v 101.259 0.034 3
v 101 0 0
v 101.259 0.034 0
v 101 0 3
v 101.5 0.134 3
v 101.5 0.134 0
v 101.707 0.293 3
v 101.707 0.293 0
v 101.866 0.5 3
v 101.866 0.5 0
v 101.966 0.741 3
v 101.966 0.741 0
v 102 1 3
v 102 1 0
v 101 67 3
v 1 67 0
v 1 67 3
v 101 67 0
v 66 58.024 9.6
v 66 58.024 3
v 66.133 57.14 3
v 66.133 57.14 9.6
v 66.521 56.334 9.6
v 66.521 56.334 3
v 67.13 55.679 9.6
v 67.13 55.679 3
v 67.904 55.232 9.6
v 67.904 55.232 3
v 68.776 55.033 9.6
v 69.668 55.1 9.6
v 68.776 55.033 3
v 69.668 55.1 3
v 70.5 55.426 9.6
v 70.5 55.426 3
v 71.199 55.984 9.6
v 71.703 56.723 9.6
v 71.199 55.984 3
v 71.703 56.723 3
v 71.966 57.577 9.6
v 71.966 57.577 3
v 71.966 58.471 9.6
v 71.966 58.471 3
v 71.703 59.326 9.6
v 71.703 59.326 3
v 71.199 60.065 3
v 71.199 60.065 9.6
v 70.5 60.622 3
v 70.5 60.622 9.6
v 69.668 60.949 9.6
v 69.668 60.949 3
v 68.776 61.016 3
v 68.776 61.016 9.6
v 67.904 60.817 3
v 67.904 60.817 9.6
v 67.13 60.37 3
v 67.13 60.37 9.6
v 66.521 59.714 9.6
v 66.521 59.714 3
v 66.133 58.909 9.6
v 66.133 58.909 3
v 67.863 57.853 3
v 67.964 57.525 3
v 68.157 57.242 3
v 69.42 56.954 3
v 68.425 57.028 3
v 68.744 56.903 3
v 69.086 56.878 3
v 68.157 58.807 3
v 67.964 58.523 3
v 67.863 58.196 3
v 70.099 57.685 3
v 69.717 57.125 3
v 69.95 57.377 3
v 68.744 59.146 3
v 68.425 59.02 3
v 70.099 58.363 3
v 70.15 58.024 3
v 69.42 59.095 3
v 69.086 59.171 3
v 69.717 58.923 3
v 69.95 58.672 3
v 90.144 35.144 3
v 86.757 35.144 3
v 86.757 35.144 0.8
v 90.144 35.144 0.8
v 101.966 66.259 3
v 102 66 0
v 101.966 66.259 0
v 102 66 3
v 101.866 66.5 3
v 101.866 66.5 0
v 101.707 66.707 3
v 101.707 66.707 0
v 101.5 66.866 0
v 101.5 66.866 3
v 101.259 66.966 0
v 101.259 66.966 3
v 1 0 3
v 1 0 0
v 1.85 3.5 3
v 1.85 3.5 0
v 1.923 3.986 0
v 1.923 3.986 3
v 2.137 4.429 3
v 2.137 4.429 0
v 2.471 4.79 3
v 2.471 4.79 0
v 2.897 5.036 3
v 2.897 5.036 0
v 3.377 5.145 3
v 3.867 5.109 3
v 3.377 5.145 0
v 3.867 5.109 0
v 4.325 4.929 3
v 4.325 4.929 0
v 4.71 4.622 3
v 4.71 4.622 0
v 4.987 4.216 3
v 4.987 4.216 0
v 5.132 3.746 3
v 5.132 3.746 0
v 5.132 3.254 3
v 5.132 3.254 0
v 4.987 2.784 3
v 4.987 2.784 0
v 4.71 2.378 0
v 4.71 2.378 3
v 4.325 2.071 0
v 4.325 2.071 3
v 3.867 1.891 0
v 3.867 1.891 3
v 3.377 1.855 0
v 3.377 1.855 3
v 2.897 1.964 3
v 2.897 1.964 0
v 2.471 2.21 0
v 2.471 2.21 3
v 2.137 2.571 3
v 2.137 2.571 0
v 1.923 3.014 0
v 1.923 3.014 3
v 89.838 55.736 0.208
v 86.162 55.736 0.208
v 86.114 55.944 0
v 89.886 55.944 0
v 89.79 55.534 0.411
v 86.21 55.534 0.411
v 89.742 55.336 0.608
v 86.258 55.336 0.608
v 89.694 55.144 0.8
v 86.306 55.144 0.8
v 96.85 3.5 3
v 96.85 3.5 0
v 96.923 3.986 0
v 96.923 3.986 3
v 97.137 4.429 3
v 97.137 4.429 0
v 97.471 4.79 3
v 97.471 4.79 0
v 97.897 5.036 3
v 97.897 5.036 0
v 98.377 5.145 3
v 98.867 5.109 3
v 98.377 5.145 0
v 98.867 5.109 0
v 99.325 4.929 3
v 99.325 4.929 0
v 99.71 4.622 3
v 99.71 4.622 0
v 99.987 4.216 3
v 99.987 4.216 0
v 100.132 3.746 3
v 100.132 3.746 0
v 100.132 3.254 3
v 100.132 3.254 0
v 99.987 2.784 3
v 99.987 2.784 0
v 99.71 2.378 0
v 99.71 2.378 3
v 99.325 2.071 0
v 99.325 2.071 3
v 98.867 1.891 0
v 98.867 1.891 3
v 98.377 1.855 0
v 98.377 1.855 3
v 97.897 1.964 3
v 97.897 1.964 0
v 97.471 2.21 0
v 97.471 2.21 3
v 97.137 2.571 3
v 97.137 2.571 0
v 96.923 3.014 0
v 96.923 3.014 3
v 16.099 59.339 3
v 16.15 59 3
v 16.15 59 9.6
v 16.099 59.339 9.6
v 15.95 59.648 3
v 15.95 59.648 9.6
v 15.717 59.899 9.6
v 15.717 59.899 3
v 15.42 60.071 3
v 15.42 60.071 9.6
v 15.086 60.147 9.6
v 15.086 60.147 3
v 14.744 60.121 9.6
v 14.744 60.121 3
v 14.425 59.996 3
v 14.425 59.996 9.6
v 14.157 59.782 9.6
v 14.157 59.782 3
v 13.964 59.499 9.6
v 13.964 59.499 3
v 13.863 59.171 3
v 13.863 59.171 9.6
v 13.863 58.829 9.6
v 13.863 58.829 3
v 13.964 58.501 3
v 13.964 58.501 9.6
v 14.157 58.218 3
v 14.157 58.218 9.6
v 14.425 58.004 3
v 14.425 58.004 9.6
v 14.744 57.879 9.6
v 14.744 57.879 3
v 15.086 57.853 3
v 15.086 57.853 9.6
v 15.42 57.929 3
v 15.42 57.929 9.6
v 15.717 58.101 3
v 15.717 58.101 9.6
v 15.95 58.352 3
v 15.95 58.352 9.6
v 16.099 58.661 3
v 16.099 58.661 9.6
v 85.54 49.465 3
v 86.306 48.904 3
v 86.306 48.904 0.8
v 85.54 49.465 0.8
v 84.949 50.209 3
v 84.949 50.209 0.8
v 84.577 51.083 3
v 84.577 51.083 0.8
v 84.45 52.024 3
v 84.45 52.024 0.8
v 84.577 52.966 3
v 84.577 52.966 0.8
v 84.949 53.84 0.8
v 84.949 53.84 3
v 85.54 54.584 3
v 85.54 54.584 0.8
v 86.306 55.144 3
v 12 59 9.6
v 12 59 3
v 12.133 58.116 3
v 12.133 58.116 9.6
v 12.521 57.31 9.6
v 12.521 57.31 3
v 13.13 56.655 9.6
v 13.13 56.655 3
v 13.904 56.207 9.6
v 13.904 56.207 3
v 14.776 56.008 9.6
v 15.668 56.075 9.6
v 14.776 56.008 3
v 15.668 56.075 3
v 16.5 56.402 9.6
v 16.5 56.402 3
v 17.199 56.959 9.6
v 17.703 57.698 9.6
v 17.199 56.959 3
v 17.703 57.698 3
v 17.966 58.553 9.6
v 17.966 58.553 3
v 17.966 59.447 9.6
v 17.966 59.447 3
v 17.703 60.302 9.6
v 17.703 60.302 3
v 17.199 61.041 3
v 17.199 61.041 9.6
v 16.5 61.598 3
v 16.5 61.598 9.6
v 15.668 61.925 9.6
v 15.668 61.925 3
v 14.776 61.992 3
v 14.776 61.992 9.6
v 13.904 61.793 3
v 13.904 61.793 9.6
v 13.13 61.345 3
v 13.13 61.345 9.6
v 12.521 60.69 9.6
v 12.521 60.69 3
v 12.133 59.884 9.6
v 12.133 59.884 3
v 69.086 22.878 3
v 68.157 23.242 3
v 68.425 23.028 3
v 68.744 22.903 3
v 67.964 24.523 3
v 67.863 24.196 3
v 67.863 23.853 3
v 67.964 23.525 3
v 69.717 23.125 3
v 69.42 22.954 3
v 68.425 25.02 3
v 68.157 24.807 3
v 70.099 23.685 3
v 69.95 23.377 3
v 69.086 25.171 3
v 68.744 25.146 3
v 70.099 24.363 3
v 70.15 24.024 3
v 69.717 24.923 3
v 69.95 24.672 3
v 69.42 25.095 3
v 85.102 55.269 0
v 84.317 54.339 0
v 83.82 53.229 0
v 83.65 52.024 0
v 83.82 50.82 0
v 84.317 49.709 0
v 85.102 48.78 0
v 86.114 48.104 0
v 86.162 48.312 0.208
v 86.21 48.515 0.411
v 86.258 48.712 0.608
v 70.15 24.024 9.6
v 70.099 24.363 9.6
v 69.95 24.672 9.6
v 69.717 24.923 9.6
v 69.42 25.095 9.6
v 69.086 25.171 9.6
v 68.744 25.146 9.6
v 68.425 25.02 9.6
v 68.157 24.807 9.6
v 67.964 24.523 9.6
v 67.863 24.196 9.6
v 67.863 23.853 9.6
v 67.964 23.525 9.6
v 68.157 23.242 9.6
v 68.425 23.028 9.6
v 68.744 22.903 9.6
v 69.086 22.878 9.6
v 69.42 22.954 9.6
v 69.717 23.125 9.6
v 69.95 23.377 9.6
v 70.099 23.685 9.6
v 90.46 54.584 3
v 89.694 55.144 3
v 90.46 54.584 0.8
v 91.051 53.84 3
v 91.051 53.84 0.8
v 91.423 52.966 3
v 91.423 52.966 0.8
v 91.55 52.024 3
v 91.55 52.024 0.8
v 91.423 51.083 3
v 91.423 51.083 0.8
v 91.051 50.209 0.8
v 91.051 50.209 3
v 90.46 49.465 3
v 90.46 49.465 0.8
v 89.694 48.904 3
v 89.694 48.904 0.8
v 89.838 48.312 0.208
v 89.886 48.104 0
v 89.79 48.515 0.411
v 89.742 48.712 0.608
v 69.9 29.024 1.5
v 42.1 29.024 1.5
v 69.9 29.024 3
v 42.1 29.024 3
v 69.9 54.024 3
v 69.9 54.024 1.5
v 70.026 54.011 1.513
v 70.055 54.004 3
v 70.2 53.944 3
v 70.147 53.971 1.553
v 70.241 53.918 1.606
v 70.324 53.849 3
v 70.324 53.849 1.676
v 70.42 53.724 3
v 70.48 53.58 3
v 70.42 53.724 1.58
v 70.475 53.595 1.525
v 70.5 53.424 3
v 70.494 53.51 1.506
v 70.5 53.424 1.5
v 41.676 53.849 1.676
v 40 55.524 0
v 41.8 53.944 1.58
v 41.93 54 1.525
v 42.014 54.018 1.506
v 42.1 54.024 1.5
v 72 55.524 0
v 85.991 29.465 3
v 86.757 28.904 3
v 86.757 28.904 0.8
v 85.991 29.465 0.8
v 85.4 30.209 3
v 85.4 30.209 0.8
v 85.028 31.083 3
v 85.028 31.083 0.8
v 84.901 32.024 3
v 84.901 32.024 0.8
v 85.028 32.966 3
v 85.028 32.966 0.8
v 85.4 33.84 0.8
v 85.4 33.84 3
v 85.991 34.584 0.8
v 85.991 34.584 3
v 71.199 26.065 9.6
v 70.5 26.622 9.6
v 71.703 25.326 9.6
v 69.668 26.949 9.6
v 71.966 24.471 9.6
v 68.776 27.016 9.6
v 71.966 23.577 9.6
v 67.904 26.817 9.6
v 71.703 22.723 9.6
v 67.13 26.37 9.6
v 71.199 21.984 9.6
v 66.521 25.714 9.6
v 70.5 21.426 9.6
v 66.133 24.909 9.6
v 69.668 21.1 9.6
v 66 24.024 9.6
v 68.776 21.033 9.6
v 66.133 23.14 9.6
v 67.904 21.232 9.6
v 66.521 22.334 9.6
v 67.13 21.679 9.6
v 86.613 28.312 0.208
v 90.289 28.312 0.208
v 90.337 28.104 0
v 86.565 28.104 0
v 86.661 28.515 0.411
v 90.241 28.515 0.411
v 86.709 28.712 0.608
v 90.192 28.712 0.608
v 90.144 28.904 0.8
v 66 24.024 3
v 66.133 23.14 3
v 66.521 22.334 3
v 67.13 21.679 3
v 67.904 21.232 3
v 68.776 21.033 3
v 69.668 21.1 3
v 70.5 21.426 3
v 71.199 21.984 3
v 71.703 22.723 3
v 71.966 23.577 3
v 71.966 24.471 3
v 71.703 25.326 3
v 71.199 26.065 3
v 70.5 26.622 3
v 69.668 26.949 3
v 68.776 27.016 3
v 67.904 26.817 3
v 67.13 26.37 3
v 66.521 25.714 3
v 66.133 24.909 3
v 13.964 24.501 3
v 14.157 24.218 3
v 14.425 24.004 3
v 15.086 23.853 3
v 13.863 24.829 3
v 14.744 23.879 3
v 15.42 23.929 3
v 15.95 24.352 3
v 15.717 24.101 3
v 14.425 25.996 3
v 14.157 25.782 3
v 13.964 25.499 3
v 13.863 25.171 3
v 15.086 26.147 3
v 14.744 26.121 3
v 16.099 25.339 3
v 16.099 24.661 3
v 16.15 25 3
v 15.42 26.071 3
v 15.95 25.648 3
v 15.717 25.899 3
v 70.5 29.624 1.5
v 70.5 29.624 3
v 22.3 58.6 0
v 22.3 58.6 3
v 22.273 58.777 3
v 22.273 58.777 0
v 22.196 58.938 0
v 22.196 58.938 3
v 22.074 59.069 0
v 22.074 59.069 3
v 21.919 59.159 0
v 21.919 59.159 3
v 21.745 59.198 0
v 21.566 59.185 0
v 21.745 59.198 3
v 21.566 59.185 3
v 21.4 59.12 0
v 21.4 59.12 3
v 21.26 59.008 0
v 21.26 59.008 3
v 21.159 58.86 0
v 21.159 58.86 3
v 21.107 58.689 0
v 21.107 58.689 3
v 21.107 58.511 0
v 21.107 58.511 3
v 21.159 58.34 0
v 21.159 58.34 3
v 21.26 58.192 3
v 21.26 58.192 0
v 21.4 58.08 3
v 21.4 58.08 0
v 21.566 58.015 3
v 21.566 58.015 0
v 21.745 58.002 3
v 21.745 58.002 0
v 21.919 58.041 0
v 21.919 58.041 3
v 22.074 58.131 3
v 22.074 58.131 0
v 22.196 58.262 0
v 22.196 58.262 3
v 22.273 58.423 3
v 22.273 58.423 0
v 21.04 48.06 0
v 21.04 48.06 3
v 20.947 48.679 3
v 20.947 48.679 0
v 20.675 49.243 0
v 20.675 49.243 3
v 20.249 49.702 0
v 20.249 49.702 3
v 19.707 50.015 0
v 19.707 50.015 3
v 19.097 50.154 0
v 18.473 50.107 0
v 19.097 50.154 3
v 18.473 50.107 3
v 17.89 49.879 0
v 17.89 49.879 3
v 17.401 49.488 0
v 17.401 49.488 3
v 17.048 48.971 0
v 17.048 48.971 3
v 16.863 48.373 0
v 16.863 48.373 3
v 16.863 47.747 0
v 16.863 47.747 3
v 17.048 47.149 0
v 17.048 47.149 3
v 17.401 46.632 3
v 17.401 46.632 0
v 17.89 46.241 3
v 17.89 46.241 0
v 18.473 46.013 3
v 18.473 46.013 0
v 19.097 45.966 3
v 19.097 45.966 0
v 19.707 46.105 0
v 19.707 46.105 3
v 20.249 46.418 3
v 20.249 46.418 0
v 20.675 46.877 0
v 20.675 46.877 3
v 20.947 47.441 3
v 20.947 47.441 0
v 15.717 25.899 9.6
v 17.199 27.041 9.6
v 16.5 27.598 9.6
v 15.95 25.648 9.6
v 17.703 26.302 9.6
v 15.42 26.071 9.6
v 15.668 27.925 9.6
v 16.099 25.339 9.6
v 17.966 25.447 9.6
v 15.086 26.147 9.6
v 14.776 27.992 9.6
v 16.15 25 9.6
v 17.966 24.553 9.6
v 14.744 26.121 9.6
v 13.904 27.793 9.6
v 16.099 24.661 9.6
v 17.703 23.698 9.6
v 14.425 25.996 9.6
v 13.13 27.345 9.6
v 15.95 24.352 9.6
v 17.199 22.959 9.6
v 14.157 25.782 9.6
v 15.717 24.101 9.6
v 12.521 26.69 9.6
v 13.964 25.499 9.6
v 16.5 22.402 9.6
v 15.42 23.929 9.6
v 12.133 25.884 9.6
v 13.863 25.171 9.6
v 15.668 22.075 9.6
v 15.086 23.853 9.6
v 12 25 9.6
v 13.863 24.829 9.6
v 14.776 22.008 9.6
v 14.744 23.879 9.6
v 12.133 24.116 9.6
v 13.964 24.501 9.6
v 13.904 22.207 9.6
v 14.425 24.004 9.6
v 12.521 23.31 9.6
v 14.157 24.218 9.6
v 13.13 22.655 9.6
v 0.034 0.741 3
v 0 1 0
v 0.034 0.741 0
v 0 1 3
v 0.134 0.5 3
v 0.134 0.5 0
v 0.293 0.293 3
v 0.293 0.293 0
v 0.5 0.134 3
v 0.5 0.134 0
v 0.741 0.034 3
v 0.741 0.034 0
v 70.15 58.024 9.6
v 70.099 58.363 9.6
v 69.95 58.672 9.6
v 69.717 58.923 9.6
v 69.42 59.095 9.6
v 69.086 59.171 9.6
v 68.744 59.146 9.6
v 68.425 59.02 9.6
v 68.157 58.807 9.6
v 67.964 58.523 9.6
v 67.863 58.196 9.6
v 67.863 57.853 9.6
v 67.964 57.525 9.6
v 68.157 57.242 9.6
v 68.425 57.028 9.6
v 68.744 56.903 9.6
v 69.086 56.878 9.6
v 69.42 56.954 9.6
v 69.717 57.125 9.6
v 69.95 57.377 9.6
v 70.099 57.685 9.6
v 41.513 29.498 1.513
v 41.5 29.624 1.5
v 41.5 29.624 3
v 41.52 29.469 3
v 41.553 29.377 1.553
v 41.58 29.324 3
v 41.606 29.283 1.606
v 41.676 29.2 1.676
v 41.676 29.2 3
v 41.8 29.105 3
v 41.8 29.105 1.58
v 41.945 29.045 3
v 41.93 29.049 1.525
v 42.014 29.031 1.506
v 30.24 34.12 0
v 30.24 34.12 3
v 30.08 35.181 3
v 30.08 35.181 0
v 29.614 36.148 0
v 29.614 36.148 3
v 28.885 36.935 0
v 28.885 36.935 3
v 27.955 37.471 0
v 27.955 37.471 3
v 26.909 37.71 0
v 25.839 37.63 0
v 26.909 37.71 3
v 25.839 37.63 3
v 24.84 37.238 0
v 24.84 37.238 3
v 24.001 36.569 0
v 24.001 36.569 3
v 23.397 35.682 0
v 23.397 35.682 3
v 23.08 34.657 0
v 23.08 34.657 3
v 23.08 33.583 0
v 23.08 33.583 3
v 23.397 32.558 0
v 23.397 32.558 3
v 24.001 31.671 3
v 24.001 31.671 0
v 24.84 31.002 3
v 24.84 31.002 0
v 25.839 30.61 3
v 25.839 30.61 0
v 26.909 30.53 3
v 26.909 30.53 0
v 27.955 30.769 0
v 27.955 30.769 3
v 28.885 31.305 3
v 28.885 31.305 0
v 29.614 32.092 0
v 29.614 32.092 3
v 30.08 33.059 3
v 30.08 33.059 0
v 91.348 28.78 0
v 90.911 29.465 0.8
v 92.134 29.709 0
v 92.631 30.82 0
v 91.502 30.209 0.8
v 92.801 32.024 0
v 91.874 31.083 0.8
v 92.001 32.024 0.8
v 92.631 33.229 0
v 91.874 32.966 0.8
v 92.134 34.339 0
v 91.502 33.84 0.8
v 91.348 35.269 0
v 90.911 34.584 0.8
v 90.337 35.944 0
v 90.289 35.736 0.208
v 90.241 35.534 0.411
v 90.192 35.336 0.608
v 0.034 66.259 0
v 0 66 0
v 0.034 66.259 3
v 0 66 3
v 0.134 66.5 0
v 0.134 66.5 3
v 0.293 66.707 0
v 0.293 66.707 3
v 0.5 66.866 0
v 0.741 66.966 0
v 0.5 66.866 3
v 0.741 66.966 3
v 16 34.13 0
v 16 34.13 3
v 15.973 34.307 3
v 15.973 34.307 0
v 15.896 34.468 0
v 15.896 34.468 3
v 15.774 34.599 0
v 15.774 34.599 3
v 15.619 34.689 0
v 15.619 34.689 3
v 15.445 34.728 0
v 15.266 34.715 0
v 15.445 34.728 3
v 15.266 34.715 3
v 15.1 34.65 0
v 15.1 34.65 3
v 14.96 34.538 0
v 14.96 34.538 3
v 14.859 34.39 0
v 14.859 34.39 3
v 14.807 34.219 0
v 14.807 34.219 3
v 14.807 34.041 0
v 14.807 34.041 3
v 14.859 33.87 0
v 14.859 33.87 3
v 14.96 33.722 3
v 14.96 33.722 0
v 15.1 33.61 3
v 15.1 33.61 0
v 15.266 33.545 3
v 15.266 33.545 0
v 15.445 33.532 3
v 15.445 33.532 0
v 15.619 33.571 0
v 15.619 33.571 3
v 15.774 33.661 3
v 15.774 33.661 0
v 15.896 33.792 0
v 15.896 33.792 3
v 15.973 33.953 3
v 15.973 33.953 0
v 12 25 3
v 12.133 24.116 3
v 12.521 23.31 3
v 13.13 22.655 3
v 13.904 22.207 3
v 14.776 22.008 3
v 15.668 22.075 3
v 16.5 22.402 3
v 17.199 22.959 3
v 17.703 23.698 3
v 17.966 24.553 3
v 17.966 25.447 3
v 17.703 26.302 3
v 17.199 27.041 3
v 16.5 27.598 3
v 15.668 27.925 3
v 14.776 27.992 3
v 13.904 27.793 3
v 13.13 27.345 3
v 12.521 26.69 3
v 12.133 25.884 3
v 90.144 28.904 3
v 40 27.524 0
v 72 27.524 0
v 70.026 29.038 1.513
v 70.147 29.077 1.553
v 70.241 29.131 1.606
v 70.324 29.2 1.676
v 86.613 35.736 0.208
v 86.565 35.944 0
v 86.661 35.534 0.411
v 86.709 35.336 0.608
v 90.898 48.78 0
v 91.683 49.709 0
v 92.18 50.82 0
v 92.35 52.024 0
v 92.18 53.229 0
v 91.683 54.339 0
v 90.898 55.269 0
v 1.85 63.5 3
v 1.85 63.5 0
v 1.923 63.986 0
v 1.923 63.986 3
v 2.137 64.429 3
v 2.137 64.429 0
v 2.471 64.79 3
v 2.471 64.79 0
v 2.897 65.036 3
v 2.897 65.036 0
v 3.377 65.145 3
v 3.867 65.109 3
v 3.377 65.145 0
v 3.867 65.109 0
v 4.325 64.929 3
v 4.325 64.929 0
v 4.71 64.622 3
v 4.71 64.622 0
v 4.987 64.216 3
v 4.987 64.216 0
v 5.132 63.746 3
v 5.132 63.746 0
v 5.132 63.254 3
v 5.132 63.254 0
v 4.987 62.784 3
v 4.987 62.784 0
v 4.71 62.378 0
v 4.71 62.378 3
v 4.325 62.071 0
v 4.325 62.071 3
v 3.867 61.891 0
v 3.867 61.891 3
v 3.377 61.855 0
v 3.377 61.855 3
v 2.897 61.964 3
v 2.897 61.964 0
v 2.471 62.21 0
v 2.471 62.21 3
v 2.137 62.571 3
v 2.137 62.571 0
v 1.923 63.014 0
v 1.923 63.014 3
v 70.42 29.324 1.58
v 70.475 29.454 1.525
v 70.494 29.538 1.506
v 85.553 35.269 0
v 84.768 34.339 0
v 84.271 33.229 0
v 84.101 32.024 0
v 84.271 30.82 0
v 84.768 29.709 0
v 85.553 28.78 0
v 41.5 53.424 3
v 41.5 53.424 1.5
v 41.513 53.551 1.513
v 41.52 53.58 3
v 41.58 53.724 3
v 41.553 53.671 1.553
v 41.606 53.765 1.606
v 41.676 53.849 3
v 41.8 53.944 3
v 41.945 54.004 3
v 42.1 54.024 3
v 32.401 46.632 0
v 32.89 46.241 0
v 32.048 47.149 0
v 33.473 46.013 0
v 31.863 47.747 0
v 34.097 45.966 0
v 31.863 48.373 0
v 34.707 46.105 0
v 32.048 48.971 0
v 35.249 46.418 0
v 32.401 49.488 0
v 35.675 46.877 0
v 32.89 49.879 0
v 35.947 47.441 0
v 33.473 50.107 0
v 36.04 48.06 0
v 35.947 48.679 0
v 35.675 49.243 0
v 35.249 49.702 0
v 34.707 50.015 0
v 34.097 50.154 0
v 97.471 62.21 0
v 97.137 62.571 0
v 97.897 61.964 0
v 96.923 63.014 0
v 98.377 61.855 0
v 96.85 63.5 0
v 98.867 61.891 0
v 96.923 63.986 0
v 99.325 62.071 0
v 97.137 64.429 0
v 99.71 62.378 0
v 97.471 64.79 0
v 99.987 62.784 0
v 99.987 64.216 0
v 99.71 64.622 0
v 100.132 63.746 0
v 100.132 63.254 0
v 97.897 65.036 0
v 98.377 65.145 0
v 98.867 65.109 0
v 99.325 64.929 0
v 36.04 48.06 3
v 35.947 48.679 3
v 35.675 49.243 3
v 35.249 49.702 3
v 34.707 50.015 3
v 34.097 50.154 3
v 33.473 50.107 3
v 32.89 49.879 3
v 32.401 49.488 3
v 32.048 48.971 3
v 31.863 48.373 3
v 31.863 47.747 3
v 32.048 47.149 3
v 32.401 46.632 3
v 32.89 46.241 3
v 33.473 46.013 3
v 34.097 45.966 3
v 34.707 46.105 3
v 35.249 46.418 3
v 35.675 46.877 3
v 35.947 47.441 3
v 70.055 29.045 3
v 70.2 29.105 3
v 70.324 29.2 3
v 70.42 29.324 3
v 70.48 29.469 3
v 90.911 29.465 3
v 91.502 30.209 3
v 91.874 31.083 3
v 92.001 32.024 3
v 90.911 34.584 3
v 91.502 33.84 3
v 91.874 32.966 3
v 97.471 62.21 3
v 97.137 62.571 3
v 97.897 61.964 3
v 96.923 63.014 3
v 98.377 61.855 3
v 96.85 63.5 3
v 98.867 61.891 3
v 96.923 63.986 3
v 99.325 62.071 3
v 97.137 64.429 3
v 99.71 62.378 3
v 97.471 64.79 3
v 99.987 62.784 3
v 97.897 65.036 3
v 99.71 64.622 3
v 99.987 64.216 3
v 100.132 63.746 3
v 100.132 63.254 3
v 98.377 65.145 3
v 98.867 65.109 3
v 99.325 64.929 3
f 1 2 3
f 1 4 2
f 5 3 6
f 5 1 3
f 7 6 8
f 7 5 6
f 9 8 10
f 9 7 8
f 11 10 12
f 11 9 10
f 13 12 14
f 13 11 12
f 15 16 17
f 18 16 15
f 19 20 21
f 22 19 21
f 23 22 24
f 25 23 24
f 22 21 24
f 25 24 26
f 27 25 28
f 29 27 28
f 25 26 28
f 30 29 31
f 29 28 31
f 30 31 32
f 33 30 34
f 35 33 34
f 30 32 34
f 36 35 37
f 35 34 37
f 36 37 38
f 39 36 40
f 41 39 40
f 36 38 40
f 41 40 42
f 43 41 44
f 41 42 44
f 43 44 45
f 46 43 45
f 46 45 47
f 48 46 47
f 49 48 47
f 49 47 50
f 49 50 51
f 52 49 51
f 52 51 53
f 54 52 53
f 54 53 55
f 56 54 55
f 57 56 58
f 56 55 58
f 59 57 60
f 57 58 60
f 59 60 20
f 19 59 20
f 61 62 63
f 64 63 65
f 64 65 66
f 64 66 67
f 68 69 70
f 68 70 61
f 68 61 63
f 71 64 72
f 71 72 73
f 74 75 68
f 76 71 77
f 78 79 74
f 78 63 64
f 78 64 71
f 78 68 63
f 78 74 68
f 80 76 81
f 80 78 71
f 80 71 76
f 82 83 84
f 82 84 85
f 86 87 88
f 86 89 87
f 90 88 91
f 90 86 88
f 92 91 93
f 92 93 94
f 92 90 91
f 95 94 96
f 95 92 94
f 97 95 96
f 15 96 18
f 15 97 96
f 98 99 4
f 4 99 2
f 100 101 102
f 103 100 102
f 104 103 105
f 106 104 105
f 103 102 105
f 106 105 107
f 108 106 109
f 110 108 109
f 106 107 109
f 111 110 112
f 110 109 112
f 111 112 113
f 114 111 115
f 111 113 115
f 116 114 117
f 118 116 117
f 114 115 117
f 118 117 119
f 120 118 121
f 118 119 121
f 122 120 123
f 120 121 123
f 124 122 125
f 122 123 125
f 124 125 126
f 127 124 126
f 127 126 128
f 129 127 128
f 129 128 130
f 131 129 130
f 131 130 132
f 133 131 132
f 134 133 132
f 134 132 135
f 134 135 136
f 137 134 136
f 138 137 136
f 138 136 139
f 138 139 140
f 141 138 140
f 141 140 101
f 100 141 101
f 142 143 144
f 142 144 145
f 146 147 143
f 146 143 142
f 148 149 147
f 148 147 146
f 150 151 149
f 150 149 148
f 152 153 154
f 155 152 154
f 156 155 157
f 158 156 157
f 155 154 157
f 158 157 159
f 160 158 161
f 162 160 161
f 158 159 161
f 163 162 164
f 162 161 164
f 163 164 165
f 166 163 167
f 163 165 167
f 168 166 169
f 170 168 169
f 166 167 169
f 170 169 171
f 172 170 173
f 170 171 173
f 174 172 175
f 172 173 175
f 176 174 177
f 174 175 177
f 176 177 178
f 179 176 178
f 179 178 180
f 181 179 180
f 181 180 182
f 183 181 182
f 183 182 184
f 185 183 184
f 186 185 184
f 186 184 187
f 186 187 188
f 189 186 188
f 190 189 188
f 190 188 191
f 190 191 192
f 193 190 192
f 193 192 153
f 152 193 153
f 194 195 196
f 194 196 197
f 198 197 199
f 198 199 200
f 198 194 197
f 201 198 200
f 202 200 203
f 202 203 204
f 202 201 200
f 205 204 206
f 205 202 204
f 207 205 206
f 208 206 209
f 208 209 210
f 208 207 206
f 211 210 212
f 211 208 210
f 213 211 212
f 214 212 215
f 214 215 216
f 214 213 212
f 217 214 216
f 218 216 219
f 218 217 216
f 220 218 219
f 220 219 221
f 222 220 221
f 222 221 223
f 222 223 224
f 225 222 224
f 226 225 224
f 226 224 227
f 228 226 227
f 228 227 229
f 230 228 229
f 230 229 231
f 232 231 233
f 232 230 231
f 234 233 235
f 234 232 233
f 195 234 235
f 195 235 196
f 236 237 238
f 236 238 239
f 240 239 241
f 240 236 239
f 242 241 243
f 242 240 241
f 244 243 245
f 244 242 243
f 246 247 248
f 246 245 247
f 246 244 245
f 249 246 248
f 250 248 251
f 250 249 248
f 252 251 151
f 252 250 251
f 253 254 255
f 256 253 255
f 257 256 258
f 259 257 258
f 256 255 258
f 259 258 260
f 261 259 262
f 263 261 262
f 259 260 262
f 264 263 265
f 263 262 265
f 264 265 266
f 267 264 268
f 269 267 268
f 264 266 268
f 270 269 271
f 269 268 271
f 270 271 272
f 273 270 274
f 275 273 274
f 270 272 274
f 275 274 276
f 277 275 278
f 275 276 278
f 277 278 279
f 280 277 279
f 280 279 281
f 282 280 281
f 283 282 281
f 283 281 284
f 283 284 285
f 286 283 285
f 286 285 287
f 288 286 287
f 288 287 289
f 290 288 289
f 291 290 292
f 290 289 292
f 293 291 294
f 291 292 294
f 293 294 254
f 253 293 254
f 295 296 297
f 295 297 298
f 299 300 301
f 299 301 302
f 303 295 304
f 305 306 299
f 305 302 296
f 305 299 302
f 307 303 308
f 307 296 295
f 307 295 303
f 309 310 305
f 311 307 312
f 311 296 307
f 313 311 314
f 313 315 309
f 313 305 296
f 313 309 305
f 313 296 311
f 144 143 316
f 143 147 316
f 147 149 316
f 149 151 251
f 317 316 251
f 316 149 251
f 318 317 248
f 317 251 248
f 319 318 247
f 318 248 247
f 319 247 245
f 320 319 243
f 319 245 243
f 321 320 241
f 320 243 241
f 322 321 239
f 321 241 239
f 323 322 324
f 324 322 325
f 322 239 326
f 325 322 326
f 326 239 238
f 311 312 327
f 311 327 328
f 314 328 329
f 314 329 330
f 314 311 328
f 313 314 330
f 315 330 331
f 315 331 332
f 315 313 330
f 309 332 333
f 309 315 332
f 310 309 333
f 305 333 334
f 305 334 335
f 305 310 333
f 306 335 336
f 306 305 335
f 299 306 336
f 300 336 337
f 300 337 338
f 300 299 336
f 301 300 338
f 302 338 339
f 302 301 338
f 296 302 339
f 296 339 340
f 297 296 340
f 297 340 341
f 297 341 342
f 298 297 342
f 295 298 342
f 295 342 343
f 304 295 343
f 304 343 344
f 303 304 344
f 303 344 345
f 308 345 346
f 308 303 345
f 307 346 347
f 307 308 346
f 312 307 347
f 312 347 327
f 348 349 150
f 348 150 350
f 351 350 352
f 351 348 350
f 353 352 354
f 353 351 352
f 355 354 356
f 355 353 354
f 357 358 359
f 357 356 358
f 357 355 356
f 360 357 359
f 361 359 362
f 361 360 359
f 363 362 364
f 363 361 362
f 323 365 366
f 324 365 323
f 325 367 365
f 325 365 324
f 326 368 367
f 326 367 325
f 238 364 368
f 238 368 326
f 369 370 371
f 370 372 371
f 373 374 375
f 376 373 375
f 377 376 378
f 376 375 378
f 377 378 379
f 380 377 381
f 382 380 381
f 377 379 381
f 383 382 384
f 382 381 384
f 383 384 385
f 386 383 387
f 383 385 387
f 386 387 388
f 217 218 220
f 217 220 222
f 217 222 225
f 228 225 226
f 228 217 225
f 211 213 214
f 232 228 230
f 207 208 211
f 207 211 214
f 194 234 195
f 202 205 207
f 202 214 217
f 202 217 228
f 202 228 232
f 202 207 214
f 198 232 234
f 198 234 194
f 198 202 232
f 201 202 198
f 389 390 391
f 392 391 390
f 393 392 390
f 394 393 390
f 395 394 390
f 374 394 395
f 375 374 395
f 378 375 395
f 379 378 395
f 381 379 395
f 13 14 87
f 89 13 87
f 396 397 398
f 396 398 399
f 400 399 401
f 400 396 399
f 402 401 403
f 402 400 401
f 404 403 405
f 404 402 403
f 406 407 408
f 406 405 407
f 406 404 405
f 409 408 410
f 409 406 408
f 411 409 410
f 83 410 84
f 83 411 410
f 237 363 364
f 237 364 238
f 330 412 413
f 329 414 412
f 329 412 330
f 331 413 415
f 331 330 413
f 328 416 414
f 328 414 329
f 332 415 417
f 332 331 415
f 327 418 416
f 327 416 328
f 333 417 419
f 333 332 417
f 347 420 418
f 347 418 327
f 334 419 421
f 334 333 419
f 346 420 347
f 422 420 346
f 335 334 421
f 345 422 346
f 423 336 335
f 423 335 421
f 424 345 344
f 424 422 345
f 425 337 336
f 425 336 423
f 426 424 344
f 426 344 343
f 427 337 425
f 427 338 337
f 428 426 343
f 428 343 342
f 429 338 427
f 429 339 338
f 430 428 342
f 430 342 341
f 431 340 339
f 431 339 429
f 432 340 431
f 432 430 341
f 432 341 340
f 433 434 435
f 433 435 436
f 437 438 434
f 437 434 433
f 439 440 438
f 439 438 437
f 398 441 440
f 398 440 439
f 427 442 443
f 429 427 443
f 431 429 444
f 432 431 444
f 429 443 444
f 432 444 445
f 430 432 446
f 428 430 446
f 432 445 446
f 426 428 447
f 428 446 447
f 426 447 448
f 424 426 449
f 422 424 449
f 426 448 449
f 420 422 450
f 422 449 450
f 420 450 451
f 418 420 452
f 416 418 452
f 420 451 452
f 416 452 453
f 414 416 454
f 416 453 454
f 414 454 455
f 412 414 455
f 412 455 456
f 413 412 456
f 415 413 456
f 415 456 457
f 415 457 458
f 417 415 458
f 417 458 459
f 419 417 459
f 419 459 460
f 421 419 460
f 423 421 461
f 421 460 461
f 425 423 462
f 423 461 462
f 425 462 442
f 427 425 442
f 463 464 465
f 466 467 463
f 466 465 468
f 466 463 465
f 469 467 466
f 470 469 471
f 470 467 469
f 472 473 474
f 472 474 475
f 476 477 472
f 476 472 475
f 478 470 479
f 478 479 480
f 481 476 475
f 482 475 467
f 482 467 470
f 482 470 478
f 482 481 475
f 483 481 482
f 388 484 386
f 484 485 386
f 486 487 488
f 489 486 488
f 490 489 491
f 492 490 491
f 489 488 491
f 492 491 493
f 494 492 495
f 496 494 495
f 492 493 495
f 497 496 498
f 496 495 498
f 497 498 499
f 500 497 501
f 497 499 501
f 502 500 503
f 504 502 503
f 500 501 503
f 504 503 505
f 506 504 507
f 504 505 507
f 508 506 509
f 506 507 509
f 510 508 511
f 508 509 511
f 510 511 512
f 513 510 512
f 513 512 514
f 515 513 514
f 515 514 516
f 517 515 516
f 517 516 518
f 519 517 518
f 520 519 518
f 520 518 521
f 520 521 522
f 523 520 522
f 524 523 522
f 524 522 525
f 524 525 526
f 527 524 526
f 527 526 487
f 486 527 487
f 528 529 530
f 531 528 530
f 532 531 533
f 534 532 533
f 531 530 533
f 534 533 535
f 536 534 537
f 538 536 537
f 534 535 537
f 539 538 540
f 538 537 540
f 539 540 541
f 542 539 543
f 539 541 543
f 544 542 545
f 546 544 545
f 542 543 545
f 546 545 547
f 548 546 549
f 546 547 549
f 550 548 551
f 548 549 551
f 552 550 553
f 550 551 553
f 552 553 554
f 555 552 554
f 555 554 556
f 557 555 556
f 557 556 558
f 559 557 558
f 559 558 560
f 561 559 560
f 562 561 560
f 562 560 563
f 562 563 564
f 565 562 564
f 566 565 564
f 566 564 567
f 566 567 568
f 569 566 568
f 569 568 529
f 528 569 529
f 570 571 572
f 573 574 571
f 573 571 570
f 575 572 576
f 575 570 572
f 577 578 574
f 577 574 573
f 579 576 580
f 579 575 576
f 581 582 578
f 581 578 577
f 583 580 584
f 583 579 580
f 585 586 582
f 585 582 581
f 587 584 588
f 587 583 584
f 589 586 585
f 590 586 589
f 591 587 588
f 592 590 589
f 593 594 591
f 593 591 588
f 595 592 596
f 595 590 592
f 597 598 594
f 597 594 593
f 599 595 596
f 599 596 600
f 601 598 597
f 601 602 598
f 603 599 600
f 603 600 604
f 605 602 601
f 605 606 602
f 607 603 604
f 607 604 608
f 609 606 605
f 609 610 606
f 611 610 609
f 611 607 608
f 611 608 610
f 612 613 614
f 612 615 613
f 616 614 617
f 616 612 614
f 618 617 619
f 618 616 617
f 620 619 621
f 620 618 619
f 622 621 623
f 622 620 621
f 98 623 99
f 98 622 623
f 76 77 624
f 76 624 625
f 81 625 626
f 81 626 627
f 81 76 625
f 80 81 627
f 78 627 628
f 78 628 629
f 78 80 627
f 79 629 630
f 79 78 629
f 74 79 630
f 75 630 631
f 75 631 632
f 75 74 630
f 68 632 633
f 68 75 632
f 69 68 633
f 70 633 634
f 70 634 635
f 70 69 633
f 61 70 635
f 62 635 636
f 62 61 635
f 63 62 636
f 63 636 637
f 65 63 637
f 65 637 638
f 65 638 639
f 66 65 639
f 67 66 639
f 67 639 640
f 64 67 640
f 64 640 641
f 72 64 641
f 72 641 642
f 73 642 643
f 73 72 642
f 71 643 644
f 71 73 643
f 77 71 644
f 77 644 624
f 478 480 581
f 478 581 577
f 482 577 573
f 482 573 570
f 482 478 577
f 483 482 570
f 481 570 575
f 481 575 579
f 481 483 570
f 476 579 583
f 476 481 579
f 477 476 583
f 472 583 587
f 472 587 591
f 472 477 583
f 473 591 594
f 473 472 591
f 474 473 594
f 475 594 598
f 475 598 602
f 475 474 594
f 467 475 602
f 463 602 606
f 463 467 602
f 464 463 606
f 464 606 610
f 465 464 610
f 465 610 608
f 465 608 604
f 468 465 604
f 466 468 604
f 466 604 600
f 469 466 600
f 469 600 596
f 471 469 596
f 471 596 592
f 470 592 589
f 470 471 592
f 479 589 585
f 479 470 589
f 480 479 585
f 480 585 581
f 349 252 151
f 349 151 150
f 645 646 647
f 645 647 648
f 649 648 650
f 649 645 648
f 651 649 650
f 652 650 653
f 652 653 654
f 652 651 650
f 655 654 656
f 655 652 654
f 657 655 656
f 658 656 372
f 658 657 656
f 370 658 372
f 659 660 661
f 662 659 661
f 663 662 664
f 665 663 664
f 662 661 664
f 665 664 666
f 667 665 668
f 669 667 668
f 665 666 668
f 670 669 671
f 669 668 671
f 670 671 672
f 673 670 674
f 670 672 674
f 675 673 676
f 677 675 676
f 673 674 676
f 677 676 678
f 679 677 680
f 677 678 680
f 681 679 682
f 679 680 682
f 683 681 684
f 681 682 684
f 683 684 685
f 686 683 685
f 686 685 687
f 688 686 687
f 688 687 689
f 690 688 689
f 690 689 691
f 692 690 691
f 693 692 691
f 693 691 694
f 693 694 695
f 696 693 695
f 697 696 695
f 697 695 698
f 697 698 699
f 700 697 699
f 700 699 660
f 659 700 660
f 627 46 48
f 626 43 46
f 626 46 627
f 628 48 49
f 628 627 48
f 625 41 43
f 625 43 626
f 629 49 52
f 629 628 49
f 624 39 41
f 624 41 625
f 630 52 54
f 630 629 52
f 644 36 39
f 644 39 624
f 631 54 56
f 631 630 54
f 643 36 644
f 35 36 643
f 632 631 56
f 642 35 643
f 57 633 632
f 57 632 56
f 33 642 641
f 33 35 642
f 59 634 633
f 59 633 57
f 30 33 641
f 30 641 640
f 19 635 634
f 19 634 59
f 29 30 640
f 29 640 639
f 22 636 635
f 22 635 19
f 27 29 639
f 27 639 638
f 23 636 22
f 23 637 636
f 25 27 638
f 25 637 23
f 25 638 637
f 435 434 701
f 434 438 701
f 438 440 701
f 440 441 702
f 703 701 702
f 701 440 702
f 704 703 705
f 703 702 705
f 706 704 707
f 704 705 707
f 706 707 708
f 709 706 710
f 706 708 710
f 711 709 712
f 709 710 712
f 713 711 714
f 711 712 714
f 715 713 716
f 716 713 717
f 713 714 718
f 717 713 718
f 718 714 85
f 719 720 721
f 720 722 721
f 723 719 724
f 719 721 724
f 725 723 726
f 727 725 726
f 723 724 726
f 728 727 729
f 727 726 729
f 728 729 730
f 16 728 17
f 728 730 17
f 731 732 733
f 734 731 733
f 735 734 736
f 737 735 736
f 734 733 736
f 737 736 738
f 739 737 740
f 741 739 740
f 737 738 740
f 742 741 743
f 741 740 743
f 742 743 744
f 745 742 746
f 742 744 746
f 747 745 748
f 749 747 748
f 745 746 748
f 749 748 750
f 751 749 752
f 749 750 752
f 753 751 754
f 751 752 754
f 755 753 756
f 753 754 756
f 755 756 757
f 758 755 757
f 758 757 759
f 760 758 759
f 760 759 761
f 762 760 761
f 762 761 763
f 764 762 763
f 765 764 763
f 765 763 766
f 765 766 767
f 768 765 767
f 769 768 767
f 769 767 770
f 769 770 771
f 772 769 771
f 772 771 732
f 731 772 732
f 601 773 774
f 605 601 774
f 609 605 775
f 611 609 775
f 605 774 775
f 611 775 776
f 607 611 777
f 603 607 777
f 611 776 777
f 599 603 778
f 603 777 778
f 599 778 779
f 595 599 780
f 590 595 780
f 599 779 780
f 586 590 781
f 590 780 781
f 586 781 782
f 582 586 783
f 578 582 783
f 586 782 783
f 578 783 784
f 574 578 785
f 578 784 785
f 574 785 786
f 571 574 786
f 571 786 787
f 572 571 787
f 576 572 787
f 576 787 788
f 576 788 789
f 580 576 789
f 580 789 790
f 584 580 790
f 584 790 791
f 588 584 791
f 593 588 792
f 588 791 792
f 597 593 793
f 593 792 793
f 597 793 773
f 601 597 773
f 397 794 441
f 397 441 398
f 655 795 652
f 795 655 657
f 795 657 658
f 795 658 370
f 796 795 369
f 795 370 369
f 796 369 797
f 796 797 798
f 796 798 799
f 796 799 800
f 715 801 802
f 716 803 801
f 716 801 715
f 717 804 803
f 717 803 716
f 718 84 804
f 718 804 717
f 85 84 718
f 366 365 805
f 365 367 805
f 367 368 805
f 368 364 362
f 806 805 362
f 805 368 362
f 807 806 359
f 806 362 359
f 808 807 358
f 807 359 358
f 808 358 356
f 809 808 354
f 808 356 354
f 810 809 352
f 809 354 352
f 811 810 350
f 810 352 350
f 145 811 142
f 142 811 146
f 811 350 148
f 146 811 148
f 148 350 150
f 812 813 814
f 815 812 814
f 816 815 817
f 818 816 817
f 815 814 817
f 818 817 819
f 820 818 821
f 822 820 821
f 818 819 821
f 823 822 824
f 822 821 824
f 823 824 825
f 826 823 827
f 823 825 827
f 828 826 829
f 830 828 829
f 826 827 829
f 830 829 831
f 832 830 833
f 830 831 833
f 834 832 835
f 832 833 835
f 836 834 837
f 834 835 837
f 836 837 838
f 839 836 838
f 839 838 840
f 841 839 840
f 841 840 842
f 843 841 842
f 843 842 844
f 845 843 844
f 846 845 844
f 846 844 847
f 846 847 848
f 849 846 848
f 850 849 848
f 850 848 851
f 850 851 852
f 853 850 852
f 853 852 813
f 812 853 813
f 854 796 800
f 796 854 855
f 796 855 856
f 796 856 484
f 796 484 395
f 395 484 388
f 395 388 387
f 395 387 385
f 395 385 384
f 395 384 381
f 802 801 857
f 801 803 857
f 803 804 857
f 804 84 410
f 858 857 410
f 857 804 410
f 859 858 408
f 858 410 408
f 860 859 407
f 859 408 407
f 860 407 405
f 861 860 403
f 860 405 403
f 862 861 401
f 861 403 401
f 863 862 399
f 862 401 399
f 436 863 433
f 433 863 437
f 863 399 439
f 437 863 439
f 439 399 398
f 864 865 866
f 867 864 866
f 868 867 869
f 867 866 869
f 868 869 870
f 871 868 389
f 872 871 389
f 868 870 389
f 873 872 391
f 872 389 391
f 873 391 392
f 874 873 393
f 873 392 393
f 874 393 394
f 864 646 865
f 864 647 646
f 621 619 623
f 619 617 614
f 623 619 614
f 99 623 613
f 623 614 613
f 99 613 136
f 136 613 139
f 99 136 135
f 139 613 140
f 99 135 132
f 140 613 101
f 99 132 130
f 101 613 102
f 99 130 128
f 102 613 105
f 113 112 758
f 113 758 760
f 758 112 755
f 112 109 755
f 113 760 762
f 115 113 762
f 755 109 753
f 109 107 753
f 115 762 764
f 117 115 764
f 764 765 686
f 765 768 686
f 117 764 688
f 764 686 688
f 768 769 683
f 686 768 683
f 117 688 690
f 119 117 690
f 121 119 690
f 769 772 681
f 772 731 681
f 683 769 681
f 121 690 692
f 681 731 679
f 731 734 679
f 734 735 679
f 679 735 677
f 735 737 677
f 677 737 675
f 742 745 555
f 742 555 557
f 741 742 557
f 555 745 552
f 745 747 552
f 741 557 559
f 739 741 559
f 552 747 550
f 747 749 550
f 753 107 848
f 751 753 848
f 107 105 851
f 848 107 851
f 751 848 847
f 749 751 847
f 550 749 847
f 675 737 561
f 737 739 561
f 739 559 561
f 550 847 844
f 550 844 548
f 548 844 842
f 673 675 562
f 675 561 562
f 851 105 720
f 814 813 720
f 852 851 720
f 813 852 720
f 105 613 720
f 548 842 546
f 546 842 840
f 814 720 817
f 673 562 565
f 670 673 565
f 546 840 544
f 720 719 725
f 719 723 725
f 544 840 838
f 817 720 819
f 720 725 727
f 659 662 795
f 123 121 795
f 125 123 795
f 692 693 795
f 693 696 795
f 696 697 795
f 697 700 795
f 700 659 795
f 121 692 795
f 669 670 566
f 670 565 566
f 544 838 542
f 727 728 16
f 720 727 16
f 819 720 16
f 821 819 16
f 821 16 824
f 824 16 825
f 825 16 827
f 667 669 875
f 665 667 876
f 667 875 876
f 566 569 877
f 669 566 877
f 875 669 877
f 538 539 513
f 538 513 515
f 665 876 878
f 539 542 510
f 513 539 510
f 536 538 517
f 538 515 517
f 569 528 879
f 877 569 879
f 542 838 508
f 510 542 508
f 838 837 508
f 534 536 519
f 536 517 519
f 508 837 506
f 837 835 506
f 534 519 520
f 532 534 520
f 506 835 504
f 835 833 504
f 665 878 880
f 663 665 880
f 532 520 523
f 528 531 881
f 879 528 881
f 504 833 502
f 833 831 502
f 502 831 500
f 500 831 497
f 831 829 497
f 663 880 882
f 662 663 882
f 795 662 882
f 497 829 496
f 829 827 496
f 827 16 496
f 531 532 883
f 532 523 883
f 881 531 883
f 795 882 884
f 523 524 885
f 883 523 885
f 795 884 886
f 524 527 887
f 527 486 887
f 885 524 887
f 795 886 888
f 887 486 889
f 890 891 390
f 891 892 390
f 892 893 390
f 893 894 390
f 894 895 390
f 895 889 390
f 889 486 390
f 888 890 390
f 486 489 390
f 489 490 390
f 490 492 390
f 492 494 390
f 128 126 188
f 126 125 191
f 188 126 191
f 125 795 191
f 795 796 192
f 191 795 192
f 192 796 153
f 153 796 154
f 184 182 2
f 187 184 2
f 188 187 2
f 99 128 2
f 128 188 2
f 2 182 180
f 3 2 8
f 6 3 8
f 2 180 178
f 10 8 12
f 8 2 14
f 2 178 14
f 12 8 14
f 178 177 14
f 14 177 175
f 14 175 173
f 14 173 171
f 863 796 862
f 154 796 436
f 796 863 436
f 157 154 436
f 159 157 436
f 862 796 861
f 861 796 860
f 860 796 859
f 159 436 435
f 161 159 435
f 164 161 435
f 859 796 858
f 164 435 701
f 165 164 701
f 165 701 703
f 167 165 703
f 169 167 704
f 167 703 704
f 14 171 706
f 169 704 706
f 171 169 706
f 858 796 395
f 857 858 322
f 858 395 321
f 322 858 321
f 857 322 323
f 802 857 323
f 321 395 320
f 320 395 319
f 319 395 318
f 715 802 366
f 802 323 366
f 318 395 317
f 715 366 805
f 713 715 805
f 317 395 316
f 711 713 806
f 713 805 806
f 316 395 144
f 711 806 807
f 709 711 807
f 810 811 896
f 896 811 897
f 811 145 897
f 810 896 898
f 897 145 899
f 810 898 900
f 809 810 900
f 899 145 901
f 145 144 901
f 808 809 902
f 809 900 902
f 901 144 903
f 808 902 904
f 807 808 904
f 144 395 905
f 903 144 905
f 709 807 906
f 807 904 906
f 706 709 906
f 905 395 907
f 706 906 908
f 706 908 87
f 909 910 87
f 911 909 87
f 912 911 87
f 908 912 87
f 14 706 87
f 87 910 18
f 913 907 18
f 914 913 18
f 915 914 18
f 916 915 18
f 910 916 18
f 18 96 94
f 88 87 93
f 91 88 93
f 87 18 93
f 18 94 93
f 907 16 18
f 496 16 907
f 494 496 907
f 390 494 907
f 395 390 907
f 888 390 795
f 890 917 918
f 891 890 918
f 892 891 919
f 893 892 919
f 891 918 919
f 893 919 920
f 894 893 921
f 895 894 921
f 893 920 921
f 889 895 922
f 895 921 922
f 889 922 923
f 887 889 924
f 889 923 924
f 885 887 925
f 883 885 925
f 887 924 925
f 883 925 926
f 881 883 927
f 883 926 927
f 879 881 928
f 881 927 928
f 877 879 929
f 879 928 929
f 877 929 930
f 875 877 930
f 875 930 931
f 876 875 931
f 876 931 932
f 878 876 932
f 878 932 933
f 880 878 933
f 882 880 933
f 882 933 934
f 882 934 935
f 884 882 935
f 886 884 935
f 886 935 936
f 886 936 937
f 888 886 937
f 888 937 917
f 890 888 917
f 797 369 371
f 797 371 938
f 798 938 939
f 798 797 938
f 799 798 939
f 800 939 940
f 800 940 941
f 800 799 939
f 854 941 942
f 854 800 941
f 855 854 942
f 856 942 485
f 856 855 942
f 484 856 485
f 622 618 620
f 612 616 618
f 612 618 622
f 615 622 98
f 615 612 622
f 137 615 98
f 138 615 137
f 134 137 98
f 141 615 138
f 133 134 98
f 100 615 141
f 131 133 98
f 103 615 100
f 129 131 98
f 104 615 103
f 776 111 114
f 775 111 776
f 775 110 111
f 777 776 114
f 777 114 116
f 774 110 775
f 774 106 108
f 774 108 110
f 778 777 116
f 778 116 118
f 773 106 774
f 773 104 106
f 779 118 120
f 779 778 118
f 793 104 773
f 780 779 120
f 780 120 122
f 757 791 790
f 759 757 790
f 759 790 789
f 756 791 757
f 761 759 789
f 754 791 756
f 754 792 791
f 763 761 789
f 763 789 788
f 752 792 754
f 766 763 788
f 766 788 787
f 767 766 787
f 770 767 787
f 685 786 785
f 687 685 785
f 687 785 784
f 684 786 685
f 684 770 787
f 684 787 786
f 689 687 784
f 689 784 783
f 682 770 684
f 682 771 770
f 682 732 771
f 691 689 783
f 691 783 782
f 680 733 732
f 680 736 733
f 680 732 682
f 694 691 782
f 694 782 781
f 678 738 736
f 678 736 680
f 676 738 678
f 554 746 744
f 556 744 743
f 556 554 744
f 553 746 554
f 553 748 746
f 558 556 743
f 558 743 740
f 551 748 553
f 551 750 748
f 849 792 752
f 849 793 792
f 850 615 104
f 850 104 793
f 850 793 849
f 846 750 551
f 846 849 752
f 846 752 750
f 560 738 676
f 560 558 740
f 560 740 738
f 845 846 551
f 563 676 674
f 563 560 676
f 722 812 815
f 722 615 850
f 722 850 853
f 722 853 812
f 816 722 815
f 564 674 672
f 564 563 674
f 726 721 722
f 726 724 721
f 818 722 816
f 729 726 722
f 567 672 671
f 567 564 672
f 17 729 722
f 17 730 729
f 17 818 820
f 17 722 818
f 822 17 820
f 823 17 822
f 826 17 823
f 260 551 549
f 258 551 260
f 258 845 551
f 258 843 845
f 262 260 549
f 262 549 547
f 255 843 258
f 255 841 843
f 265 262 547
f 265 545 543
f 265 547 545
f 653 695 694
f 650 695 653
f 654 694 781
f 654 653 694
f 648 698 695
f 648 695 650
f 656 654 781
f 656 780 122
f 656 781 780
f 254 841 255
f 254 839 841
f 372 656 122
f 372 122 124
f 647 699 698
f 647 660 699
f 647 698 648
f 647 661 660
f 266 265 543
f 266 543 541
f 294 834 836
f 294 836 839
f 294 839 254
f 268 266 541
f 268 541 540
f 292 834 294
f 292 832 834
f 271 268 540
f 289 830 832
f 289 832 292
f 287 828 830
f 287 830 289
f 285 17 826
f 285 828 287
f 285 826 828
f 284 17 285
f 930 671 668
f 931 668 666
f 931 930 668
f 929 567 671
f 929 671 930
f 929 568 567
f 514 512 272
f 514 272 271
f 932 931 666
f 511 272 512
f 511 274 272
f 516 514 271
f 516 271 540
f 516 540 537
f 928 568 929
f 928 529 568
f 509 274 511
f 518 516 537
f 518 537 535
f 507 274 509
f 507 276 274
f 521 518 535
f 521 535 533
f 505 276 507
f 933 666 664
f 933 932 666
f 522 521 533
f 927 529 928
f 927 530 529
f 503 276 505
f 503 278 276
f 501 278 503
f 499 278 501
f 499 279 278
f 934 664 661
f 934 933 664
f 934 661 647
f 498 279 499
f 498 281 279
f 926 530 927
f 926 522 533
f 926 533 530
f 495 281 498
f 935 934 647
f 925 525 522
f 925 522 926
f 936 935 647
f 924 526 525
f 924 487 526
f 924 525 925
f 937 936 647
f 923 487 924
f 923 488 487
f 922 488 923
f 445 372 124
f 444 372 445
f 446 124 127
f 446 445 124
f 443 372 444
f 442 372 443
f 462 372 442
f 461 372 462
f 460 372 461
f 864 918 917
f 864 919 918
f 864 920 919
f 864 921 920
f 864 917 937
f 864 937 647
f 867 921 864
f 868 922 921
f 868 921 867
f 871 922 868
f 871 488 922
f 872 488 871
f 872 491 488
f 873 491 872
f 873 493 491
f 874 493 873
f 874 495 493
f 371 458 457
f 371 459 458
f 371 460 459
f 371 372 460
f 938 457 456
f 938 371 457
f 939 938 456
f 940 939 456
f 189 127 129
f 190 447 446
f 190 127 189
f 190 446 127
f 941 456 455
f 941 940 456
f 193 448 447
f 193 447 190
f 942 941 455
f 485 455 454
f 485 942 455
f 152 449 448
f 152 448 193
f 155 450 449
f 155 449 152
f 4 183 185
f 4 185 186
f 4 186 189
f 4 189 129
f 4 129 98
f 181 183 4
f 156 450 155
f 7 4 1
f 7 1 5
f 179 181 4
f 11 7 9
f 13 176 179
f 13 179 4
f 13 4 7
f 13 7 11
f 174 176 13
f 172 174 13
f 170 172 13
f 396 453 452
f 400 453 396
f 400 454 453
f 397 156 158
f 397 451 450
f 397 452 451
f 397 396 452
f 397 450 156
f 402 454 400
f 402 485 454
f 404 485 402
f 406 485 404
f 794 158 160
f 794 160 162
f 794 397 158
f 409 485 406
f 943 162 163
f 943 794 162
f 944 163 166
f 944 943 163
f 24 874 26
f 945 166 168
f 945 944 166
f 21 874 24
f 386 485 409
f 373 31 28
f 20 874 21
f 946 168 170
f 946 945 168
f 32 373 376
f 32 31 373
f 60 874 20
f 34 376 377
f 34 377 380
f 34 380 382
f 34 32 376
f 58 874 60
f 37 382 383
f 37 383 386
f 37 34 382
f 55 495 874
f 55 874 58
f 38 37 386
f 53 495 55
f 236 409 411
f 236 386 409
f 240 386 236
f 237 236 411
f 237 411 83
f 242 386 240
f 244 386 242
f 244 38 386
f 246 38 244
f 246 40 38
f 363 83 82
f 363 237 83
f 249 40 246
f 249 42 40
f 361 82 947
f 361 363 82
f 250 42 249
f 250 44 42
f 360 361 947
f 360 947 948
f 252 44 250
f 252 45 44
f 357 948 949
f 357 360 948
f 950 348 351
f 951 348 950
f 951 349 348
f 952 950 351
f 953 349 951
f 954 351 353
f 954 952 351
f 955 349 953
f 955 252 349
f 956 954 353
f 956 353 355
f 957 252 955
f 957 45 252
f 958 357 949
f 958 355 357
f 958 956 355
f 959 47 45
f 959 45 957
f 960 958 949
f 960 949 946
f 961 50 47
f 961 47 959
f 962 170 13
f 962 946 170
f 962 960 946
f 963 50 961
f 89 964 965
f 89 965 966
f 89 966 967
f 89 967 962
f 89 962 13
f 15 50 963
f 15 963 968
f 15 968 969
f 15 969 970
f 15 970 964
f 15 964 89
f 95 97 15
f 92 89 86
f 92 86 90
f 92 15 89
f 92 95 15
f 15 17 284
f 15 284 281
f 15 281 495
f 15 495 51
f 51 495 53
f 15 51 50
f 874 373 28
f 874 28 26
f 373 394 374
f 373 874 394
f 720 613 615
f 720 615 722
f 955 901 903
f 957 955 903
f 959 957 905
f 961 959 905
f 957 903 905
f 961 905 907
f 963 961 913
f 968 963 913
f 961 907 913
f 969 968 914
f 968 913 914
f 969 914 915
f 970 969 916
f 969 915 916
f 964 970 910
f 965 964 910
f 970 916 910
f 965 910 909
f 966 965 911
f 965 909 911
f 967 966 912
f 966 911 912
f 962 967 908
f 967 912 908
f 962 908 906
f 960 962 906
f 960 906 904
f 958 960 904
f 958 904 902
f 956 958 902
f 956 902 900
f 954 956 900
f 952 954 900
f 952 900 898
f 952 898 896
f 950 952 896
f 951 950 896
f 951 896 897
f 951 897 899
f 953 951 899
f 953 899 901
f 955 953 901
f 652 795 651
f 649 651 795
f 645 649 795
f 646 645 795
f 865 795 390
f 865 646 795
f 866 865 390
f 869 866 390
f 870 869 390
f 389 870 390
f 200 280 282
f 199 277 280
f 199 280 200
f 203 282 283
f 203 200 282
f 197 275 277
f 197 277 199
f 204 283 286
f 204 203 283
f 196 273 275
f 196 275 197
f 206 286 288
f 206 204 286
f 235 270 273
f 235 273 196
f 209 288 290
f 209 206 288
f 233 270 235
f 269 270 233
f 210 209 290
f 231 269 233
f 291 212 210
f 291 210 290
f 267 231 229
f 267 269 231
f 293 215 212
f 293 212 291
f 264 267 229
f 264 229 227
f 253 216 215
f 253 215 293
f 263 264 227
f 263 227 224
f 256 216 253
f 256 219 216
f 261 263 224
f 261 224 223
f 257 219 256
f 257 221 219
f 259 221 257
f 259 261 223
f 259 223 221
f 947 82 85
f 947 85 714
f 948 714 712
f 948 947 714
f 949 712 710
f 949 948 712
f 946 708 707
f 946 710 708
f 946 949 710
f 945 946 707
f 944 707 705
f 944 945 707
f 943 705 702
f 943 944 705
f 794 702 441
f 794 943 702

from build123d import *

# Parameters (mm, degrees)
SKETCH_1_W          = 102
SKETCH_1_H          = 67
EXTRUDE_1_DEPTH     = 3
FILLET_1_R          = 1
SKETCH_2_R          = 3
SKETCH_2_R_2        = 1.15
EXTRUDE_2_DEPTH     = 6.6
SKETCH_3_R          = 3.6
SKETCH_3_R_2        = 2.1
SKETCH_3_R_3        = 0.6
SKETCH_3_W          = 29
SKETCH_3_H          = 25
CUT_EXTRUDE_1_DEPTH = 123.215220001
CHAMFER_1_SIZE      = 1.5
CHAMFER_2_SIZE      = 0.8
SKETCH_4_R          = 1.65
CUT_EXTRUDE_2_DEPTH = 123.413888101
FILLET_2_R          = 0.6


with BuildPart() as part:
    # 草图1 → 凸台-拉伸1 (new body)
    with BuildSketch(Plane.XY):
        with Locations((51, 33.5)):
            Rectangle(SKETCH_1_W, SKETCH_1_H)
    extrude(amount=EXTRUDE_1_DEPTH)

    # 圆角1
    fillet_1_edges = [part.edges().sort_by_distance(p)[0] for p in [
        (0, 67, 1.5),
        (102, 67, 1.5),
        (102, 0, 1.5),
        (0, 0, 1.5),
    ]]
    fillet(fillet_1_edges, radius=FILLET_1_R)

    # 草图2 → 凸台-拉伸2 (add)
    # profile 1 of 4: a face of its own
    with BuildSketch(Plane.XY.offset(3)):
        with Locations(Location((15, 59, 0), (0, 0, 180))):
            Circle(SKETCH_2_R)
        with Locations((15, 59)):
            Circle(SKETCH_2_R_2, mode=Mode.SUBTRACT)
    # profile 2 of 4: a face of its own
    with BuildSketch(Plane.XY.offset(3)):
        with Locations(Location((15, 25, 0), (0, 0, 180))):
            Circle(SKETCH_2_R)
        with Locations((15, 25)):
            Circle(SKETCH_2_R_2, mode=Mode.SUBTRACT)
    # profile 3 of 4: a face of its own
    with BuildSketch(Plane.XY.offset(3)):
        with Locations(Location((69, 24.024333843, 0), (0, 0, 180))):
            Circle(SKETCH_2_R)
        with Locations((69, 24.024333843)):
            Circle(SKETCH_2_R_2, mode=Mode.SUBTRACT)
    # profile 4 of 4: a face of its own
    with BuildSketch(Plane.XY.offset(3)):
        with Locations(Location((69, 58.024333843, 0), (0, 0, 180))):
            Circle(SKETCH_2_R)
        with Locations((69, 58.024333843)):
            Circle(SKETCH_2_R_2, mode=Mode.SUBTRACT)
    extrude(amount=EXTRUDE_2_DEPTH)

    # 草图3 → 切除-拉伸1 (cut, through all)
    with BuildSketch(Plane.XY.offset(3)):
        with Locations((26.64, 34.12)):
            Circle(SKETCH_3_R)
        with Locations((18.94, 48.06)):
            Circle(SKETCH_3_R_2)
        with Locations((33.94, 48.06)):
            Circle(SKETCH_3_R_2)
        with Locations((21.7, 58.6)):
            Circle(SKETCH_3_R_3)
        with Locations((15.4, 34.13)):
            Circle(SKETCH_3_R_3)
        with BuildLine():
            Line((86.757305392, 35.144333843), (90.144398541, 35.144333843))
            ThreePointArc((90.144398541, 35.144333843), (92.000851967, 32.024333843), (90.144398541, 28.904333843))
            Line((90.144398541, 28.904333843), (86.757305392, 28.904333843))
            ThreePointArc((86.757305392, 28.904333843), (84.900851967, 32.024333843), (86.757305392, 35.144333843))
        make_face()
        with Locations((56, 41.524333843)):
            Rectangle(SKETCH_3_W, SKETCH_3_H)
        with BuildLine():
            Line((86.306453426, 55.144333843), (89.693546574, 55.144333843))
            ThreePointArc((89.693546574, 55.144333843), (91.55, 52.024333843), (89.693546574, 48.904333843))
            Line((89.693546574, 48.904333843), (86.306453426, 48.904333843))
            ThreePointArc((86.306453426, 48.904333843), (84.45, 52.024333843), (86.306453426, 55.144333843))
        make_face()
    extrude(amount=-CUT_EXTRUDE_1_DEPTH, mode=Mode.SUBTRACT)

    # 倒角1
    chamfer_1_edges = [part.edges().sort_by_distance(p)[0] for p in [
        (41.5, 41.524333843, 0),
        (56, 54.024333843, 0),
        (70.5, 41.524333843, 0),
        (56, 29.024333843, 0),
    ]]
    chamfer(chamfer_1_edges, length=CHAMFER_1_SIZE)

    # 倒角2
    chamfer_2_edges = [part.edges().sort_by_distance(p)[0] for p in [
        (84.45, 52.024333843, 0),
        (88, 55.144333843, 0),
        (91.55, 52.024333843, 0),
        (88, 48.904333843, 0),
        (84.900851967, 32.024333843, 0),
        (88.450851967, 35.144333843, 0),
        (92.000851967, 32.024333843, 0),
        (88.450851967, 28.904333843, 0),
    ]]
    chamfer(chamfer_2_edges, length=CHAMFER_2_SIZE)

    # 草图4 → 切除-拉伸2 (cut, through all)
    with BuildSketch(Plane(origin=(0, 0, 0), x_dir=(-1, 0, 0), z_dir=(0, 0, -1))):
        with Locations((-98.5, 63.5)):
            Circle(SKETCH_4_R)
        with Locations((-3.5, 63.5)):
            Circle(SKETCH_4_R)
        with Locations((-3.5, 3.5)):
            Circle(SKETCH_4_R)
        with Locations((-98.5, 3.5)):
            Circle(SKETCH_4_R)
    extrude(amount=-CUT_EXTRUDE_2_DEPTH, mode=Mode.SUBTRACT)

    # 圆角2
    fillet_2_edges = [part.edges().sort_by_distance(p)[0] for p in [
        (70.5, 54.024333843, 2.25),
        (70.5, 29.024333843, 2.25),
        (41.5, 29.024333843, 2.25),
        (41.5, 54.024333843, 2.25),
    ]]
    fillet(fillet_2_edges, radius=FILLET_2_R)


solid = part.part
